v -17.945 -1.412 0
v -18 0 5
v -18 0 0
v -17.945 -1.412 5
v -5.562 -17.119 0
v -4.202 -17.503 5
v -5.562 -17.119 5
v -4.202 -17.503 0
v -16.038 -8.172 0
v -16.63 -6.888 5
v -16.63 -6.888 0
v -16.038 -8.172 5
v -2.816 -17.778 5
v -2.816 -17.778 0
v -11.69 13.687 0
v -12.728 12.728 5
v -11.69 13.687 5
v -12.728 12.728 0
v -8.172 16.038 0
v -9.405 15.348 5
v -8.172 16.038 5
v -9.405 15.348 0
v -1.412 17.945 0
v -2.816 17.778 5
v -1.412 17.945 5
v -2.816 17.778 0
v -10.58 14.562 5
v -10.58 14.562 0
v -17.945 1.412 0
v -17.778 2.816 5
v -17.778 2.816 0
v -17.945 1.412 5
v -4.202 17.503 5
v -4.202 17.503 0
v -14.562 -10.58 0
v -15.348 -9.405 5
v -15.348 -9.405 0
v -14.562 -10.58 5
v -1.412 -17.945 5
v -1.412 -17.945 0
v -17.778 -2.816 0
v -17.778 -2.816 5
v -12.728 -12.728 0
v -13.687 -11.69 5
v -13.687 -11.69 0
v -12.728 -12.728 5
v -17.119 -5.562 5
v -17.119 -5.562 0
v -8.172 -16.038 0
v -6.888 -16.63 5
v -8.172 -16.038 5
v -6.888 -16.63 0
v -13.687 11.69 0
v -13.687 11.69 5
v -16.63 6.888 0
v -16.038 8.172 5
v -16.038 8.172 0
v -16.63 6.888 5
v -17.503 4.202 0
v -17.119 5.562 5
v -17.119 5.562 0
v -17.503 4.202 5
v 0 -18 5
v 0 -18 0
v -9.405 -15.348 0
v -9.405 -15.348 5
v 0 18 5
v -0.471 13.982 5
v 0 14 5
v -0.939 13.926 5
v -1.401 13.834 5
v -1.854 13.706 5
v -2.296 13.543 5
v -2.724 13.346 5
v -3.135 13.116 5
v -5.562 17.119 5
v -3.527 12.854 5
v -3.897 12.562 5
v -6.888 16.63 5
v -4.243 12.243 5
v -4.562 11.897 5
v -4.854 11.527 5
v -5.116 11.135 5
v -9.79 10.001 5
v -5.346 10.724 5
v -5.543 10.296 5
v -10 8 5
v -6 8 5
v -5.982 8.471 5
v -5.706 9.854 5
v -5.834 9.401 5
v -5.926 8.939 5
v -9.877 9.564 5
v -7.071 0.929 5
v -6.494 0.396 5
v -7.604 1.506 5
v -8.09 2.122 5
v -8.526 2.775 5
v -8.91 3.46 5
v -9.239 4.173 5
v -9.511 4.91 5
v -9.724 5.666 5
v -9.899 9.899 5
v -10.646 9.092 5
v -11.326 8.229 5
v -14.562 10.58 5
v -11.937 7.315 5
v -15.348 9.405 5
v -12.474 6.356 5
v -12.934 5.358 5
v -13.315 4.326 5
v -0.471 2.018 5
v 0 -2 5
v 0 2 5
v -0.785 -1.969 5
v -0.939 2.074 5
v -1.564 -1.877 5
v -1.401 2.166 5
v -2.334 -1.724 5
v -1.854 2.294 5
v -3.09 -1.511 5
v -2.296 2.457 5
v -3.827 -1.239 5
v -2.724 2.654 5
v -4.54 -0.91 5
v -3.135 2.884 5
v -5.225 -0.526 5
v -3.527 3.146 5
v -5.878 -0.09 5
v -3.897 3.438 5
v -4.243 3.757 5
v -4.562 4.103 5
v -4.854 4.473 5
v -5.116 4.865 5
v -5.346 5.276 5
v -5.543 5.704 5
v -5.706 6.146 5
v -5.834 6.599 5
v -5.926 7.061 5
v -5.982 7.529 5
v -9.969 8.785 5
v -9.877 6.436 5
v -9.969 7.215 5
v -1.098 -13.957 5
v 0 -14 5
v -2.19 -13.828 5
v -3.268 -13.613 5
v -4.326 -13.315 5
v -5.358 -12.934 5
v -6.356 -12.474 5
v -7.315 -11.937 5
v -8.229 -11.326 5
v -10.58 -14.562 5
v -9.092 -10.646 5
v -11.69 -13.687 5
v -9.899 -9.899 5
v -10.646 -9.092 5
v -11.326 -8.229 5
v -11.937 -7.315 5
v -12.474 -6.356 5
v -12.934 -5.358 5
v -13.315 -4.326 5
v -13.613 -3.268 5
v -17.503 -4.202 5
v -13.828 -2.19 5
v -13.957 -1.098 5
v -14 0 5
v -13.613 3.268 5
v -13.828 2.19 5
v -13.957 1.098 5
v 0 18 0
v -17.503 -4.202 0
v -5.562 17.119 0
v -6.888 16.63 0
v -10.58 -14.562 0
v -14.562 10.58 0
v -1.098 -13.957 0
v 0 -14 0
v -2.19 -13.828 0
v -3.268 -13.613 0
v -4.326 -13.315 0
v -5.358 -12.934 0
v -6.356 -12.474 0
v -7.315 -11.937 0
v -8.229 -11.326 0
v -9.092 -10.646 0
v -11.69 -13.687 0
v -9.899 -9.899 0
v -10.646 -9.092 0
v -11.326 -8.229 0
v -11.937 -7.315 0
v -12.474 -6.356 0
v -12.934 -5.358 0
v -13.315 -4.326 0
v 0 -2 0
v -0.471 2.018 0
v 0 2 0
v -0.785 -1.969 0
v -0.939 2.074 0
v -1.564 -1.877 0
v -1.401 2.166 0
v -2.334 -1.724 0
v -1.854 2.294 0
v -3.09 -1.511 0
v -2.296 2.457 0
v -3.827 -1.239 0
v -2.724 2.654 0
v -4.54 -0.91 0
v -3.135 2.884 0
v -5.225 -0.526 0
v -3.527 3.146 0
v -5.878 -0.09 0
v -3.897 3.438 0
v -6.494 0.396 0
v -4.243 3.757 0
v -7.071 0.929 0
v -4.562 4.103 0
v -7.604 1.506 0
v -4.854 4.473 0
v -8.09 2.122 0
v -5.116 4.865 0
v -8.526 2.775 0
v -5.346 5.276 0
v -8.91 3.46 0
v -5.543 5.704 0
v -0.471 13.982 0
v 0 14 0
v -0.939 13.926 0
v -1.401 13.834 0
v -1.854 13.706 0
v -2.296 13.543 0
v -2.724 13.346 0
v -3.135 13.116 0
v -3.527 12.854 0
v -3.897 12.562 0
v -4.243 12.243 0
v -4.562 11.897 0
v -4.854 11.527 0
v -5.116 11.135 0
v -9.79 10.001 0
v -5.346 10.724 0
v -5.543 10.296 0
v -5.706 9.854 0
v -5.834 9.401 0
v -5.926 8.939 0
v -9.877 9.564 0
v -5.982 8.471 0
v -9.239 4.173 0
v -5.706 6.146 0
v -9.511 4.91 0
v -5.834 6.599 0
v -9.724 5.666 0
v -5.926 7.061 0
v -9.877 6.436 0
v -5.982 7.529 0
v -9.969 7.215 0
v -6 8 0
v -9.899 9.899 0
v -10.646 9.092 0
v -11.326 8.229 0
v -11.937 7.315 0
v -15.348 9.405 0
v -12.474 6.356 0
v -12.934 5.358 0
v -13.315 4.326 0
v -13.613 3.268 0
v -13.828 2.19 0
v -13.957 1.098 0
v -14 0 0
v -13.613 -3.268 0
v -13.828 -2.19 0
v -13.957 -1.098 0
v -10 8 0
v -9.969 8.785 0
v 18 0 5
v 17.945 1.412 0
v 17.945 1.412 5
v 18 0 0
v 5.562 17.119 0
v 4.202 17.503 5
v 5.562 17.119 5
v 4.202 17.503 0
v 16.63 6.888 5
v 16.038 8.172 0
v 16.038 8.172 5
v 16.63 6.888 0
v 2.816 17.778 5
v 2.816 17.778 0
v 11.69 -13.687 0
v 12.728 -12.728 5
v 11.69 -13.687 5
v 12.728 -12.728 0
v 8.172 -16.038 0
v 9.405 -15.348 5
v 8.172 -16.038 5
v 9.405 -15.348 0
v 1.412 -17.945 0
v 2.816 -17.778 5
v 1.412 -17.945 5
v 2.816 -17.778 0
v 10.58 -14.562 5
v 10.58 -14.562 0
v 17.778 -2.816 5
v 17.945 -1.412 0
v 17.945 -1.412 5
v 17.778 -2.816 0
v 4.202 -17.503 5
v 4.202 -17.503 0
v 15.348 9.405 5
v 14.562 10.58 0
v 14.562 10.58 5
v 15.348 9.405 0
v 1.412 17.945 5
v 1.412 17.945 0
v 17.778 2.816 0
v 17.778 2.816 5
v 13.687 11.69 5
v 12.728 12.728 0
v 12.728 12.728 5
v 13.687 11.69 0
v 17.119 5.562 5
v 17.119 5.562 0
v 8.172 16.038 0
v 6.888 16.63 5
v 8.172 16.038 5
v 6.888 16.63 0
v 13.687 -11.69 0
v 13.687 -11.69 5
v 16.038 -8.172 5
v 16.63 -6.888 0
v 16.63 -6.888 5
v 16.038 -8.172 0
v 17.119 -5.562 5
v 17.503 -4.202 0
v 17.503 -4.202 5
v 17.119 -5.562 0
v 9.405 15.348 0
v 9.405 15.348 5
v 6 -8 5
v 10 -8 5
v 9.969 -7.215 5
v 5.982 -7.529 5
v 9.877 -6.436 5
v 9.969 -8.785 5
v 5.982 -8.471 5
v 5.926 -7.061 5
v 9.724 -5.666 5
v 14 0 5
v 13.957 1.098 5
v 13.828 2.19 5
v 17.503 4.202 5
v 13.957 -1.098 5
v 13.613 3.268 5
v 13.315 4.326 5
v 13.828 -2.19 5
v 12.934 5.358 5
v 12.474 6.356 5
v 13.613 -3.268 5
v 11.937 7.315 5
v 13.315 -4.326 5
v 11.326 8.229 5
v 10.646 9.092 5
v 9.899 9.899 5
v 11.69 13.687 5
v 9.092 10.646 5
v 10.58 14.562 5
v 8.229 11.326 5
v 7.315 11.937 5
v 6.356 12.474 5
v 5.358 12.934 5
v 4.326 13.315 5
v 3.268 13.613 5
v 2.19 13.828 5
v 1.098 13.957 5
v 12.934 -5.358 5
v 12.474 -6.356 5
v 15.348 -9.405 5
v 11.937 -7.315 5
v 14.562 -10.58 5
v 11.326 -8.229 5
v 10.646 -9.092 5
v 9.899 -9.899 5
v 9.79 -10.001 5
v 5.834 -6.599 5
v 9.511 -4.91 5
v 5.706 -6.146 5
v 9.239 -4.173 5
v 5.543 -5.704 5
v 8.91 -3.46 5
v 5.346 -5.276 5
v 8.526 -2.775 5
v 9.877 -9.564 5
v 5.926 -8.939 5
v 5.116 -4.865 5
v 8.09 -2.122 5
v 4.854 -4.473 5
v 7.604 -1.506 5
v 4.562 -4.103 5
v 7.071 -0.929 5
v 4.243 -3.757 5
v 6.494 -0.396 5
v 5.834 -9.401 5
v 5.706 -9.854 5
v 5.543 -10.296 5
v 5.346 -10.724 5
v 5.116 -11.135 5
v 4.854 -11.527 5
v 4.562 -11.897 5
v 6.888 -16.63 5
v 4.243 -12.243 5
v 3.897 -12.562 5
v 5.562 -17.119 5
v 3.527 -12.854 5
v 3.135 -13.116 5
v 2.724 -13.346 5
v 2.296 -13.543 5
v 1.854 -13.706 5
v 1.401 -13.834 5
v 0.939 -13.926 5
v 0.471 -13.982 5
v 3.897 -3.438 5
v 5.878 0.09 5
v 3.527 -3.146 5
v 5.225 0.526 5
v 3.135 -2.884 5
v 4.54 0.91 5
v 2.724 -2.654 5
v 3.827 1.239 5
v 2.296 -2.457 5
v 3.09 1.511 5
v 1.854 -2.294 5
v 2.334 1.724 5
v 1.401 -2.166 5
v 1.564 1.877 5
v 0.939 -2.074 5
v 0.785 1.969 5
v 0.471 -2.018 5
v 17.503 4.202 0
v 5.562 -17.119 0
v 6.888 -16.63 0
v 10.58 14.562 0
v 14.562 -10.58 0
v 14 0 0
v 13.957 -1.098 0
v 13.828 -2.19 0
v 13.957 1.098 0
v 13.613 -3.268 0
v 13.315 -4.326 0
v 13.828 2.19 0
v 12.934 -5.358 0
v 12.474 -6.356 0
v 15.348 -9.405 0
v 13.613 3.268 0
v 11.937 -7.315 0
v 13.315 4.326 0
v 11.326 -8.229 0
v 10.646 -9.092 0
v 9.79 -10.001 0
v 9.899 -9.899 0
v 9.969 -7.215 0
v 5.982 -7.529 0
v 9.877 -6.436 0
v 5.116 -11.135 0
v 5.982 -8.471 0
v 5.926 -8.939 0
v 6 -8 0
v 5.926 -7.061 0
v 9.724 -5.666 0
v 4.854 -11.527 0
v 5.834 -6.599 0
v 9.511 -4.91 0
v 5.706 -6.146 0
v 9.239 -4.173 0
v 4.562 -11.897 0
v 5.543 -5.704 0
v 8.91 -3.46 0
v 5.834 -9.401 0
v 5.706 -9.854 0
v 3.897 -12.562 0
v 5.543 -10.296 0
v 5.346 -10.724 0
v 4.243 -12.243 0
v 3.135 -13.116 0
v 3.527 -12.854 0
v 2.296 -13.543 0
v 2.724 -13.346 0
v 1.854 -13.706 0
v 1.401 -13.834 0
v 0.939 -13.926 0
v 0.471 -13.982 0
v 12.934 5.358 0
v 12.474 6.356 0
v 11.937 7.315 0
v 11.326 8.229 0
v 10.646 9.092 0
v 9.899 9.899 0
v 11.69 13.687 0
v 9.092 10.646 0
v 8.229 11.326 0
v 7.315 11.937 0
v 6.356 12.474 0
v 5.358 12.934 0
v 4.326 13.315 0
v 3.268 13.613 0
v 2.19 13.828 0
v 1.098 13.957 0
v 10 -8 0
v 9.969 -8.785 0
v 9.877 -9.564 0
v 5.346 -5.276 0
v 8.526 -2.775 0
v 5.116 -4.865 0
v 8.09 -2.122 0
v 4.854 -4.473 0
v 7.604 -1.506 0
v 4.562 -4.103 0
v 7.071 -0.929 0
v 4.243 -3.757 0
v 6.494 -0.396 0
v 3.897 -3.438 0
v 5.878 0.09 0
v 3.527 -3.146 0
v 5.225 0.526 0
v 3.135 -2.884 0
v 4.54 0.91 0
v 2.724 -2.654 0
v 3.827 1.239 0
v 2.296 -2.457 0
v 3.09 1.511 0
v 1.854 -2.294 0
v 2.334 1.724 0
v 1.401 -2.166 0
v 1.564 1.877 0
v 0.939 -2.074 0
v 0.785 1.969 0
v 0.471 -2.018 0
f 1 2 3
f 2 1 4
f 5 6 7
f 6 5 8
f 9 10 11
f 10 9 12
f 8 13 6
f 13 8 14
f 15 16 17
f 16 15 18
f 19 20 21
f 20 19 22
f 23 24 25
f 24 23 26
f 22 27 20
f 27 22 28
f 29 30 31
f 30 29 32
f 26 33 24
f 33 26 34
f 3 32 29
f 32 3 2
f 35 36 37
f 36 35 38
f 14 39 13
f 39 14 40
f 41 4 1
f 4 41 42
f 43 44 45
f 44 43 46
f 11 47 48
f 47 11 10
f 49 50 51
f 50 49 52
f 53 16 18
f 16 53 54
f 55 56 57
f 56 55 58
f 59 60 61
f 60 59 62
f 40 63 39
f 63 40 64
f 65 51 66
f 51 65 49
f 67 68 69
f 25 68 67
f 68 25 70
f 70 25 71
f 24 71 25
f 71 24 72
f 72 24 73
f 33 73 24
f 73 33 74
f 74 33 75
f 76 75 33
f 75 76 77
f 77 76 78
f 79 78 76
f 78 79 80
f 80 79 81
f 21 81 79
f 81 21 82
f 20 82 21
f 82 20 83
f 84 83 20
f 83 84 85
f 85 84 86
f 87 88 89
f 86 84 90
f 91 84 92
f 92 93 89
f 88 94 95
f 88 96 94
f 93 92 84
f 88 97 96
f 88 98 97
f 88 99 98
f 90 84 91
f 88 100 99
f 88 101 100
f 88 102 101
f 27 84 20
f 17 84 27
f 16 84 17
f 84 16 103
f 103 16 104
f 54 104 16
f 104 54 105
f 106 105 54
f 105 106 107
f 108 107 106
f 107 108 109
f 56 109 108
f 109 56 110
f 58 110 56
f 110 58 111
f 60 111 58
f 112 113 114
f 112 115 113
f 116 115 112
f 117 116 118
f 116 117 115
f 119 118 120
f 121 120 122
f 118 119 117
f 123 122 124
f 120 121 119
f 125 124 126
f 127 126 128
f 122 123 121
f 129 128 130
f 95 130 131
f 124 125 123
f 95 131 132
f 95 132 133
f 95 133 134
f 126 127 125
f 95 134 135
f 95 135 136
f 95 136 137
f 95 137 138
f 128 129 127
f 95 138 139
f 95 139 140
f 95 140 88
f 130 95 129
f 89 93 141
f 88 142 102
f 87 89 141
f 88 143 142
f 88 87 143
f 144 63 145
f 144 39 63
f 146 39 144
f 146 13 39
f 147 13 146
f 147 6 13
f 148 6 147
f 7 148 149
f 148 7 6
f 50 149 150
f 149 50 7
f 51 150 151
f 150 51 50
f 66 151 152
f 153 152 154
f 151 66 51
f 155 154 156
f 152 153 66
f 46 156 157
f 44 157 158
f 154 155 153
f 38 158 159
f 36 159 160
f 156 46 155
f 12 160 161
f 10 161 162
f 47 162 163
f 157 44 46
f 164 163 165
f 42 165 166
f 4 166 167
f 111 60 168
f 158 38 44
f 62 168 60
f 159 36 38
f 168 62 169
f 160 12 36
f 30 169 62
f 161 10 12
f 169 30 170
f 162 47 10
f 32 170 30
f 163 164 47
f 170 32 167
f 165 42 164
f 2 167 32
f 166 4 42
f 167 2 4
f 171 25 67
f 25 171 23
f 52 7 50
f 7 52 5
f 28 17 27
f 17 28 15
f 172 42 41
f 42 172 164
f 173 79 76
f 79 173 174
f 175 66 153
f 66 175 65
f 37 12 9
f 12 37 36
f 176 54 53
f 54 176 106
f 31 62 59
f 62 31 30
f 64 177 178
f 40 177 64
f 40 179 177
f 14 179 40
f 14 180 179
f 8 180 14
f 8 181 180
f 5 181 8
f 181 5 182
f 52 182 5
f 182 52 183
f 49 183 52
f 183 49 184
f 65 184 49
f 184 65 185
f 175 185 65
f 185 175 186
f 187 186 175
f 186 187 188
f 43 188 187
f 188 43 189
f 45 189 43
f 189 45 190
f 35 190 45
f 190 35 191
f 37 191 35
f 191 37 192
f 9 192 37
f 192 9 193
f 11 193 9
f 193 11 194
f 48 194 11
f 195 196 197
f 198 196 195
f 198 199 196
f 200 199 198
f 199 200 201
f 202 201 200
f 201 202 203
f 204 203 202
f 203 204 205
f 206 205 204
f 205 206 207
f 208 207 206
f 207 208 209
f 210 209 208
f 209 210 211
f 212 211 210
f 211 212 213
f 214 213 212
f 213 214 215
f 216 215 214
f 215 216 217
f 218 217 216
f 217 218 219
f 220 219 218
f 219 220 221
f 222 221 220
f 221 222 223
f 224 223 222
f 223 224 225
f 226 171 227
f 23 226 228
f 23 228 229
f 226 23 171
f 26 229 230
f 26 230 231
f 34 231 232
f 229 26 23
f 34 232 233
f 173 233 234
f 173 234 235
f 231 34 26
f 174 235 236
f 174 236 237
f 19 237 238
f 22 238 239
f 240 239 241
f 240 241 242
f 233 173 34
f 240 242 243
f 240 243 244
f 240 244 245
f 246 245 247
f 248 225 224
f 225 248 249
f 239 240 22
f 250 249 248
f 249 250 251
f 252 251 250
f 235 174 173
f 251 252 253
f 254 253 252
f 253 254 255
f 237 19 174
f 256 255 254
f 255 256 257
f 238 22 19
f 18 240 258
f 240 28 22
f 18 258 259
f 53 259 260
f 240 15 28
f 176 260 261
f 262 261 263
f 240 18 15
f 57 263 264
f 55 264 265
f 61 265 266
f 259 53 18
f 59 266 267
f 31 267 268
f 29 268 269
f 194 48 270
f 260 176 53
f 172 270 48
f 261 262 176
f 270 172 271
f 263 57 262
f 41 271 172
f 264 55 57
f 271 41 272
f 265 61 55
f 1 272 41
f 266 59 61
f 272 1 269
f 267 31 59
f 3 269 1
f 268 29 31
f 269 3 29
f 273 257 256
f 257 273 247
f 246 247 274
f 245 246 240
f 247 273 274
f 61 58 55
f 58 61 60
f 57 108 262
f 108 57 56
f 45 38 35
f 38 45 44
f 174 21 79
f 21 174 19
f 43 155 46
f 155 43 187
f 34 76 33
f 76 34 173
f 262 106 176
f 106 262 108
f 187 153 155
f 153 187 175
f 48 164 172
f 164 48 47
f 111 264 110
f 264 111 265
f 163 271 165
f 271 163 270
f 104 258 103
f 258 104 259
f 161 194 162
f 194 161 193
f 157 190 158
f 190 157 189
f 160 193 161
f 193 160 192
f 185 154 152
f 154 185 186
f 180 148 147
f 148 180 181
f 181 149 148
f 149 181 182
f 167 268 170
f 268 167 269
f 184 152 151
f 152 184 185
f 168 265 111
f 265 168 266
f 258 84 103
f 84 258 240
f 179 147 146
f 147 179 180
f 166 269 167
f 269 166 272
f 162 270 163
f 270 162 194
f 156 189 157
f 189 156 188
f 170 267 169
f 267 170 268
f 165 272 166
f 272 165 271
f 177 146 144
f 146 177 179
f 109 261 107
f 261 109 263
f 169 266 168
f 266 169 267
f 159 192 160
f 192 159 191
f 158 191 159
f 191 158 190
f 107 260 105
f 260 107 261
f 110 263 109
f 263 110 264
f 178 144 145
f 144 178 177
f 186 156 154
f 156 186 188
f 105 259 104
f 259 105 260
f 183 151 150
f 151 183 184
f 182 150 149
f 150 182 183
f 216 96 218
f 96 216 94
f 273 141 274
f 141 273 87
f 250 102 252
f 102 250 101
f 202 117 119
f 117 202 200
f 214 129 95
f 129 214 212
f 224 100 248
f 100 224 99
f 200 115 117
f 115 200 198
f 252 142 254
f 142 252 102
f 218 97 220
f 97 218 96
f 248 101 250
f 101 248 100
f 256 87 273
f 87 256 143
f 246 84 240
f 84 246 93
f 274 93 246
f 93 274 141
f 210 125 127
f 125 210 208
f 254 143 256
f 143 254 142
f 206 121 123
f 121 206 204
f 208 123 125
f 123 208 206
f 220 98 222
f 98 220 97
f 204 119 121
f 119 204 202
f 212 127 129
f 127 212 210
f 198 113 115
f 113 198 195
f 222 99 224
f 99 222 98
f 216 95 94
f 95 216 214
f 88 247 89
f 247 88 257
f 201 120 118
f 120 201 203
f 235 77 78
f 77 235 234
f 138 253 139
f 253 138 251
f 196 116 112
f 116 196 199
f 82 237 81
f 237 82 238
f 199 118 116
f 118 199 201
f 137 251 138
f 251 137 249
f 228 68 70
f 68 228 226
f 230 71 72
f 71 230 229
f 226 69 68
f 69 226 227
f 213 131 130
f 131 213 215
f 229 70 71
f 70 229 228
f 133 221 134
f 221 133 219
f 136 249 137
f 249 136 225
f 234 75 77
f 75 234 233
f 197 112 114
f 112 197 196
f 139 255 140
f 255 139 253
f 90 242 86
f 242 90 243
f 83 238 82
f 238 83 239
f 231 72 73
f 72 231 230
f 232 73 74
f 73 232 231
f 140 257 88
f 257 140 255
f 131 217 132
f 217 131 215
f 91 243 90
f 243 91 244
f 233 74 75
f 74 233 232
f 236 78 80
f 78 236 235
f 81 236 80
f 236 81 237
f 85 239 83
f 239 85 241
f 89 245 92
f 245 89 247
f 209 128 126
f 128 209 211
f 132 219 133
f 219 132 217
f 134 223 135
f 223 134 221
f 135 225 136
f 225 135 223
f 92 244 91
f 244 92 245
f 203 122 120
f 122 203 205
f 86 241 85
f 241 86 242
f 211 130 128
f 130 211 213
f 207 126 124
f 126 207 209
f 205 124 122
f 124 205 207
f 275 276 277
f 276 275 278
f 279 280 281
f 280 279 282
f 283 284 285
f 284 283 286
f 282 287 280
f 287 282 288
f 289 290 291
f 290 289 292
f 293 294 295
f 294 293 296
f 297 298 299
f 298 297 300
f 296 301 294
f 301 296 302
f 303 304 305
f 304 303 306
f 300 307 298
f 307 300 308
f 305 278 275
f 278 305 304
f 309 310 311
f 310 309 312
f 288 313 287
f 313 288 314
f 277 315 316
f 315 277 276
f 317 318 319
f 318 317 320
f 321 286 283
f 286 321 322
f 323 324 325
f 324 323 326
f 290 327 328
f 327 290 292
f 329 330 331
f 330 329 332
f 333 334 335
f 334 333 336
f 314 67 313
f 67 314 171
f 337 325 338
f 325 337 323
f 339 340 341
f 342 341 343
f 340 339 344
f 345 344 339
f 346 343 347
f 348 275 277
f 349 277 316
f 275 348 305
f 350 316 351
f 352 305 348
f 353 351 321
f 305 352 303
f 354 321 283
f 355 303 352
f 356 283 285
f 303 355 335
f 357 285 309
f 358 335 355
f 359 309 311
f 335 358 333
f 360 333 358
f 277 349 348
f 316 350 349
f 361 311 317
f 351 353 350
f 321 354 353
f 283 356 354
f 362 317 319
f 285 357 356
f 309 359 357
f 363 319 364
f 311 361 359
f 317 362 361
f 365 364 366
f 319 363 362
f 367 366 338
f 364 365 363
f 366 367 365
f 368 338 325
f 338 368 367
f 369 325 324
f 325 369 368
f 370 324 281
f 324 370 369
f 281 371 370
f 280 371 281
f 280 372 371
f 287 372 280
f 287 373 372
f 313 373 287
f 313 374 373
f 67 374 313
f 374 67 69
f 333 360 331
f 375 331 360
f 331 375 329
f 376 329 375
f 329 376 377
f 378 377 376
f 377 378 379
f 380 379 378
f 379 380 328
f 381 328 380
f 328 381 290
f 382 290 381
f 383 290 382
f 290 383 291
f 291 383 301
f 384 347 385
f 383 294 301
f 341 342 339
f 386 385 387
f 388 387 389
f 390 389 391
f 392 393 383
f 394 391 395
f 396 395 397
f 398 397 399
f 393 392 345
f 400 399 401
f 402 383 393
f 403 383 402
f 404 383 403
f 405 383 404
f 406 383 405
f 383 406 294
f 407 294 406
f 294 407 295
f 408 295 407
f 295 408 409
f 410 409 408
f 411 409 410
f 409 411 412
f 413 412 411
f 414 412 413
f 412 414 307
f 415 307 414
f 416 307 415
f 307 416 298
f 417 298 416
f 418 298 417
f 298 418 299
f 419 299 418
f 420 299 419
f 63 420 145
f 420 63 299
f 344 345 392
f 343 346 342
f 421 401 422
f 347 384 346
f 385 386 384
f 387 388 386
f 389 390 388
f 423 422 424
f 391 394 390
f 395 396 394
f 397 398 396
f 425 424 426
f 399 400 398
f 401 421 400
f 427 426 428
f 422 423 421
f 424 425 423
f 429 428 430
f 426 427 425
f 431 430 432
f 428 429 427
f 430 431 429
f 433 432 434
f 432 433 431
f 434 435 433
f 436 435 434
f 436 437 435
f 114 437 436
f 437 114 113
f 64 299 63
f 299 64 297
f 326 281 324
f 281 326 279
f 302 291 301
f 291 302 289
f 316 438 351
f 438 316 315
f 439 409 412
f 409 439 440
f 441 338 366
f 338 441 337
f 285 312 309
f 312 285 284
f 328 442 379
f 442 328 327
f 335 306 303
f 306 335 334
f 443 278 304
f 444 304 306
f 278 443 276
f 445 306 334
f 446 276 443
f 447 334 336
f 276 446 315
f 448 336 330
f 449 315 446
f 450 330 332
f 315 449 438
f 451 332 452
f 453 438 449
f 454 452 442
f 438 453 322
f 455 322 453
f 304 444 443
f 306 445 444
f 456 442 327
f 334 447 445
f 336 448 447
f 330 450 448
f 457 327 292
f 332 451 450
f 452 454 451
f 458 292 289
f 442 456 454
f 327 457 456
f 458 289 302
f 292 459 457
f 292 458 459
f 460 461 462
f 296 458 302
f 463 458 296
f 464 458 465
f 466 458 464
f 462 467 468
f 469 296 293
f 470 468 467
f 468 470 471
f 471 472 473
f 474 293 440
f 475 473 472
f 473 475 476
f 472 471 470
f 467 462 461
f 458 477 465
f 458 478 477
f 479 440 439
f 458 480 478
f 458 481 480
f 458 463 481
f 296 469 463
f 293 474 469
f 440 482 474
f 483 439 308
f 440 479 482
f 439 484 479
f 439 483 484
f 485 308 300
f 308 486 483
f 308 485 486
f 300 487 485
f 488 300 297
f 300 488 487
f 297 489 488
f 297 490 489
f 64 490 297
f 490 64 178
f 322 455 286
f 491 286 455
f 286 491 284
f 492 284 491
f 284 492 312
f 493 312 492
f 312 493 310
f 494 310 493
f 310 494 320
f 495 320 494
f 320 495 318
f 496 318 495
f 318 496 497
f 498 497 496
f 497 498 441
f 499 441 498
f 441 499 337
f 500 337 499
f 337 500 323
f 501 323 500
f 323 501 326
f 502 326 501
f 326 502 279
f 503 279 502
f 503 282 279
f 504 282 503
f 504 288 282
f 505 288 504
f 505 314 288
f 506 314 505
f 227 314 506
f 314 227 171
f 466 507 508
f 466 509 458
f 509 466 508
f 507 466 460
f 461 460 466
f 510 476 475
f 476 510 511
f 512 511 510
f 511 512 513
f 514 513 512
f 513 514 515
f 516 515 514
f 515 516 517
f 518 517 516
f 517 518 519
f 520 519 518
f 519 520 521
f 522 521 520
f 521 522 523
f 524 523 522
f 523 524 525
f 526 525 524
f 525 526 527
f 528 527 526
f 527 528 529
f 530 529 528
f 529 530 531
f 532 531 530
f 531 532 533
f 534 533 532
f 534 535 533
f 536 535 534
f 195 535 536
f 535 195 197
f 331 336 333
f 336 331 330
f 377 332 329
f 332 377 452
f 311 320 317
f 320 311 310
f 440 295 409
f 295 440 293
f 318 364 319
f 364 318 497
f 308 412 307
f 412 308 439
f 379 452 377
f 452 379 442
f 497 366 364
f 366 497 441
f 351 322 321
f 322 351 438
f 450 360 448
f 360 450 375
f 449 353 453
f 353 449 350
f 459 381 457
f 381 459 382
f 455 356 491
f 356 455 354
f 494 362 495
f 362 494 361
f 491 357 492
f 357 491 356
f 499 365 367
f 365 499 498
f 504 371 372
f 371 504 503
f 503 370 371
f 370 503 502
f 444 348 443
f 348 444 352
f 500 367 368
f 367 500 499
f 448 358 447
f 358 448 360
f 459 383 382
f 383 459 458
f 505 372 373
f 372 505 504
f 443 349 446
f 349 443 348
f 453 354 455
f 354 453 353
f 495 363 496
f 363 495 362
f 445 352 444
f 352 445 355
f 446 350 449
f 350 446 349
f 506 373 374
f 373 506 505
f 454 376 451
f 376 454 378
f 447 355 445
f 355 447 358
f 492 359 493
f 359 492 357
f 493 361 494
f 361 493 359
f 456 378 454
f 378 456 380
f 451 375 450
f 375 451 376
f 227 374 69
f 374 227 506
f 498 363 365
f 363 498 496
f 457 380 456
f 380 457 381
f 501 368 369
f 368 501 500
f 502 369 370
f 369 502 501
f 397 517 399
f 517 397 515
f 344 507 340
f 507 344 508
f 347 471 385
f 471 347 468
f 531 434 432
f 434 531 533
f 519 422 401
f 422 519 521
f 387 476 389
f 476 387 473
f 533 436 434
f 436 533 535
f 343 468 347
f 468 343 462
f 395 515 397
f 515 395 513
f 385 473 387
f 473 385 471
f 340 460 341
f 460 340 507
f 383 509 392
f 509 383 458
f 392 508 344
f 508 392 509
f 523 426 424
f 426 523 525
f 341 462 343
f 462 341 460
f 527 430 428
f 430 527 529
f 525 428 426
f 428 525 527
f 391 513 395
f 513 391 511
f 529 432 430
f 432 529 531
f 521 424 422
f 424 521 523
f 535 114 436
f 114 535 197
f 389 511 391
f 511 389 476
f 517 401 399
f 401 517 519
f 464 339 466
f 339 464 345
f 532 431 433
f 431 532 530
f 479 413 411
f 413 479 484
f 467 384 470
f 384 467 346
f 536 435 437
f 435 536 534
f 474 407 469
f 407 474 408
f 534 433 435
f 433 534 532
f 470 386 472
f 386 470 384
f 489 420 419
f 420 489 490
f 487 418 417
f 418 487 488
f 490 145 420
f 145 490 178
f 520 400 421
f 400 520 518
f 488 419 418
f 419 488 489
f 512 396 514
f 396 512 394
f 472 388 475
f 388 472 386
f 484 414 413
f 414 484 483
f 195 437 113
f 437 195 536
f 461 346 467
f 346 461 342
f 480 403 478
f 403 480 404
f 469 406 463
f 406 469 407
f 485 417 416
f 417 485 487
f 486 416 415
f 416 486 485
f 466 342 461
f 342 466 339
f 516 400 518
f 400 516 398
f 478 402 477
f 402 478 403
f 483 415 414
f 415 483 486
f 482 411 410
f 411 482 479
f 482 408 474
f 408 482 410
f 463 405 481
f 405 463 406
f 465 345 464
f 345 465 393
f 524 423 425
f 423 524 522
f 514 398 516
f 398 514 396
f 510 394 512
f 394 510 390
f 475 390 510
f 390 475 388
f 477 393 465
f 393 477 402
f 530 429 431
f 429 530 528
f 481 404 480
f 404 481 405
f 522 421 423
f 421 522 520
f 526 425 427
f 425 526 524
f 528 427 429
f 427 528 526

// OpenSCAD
// Diameter in mm
outer_diameter = 36; 
// any number
// Width in mm 
line_thickness = 4; 
// any number
// Thickness in mm
item_thickness = 5; 
// any number
module dr_build_outer(diameter,thickness,width) 
	{
	difference()
		{
		union()
			{
			cylinder(r=diameter/2 ,h=width, $fn=80);
			}
		union()
			{
			cylinder(r=(diameter/2)-thickness ,h=width, $fn=80);
			}
		}
	}
module dr_build_inner(diameter,thickness,width) 
	{
	difference()
		{
		union()
			{
			cylinder(r=(diameter+thickness)/4 ,h=width, $fn=80);
			}
		union()
			{
			cylinder(r=(diameter+thickness)/4-thickness ,h=width, $fn=80);
			}
		}
	}
module dr_half_build(diameter,thickness,width) 
	{
	difference()
		{
		union()
			{
			dr_build_outer(diameter,thickness,width);
			translate([0,(diameter/4)-thickness/4,0]) dr_build_inner(diameter,thickness,width);
			}
		union()
			{
			translate([0,-diameter/2,0]) cube([diameter/2,diameter,width]);
			}
		}	
	}
module dr_build(diameter,thickness,width) 
	{
	difference()
		{
		union()
			{
			dr_half_build(diameter,thickness,width);
			rotate([180,180,0]) dr_half_build(diameter,thickness,width);
			}
		union()
			{
			}
		}	
	}

dr_build(outer_diameter,line_thickness,item_thickness);
